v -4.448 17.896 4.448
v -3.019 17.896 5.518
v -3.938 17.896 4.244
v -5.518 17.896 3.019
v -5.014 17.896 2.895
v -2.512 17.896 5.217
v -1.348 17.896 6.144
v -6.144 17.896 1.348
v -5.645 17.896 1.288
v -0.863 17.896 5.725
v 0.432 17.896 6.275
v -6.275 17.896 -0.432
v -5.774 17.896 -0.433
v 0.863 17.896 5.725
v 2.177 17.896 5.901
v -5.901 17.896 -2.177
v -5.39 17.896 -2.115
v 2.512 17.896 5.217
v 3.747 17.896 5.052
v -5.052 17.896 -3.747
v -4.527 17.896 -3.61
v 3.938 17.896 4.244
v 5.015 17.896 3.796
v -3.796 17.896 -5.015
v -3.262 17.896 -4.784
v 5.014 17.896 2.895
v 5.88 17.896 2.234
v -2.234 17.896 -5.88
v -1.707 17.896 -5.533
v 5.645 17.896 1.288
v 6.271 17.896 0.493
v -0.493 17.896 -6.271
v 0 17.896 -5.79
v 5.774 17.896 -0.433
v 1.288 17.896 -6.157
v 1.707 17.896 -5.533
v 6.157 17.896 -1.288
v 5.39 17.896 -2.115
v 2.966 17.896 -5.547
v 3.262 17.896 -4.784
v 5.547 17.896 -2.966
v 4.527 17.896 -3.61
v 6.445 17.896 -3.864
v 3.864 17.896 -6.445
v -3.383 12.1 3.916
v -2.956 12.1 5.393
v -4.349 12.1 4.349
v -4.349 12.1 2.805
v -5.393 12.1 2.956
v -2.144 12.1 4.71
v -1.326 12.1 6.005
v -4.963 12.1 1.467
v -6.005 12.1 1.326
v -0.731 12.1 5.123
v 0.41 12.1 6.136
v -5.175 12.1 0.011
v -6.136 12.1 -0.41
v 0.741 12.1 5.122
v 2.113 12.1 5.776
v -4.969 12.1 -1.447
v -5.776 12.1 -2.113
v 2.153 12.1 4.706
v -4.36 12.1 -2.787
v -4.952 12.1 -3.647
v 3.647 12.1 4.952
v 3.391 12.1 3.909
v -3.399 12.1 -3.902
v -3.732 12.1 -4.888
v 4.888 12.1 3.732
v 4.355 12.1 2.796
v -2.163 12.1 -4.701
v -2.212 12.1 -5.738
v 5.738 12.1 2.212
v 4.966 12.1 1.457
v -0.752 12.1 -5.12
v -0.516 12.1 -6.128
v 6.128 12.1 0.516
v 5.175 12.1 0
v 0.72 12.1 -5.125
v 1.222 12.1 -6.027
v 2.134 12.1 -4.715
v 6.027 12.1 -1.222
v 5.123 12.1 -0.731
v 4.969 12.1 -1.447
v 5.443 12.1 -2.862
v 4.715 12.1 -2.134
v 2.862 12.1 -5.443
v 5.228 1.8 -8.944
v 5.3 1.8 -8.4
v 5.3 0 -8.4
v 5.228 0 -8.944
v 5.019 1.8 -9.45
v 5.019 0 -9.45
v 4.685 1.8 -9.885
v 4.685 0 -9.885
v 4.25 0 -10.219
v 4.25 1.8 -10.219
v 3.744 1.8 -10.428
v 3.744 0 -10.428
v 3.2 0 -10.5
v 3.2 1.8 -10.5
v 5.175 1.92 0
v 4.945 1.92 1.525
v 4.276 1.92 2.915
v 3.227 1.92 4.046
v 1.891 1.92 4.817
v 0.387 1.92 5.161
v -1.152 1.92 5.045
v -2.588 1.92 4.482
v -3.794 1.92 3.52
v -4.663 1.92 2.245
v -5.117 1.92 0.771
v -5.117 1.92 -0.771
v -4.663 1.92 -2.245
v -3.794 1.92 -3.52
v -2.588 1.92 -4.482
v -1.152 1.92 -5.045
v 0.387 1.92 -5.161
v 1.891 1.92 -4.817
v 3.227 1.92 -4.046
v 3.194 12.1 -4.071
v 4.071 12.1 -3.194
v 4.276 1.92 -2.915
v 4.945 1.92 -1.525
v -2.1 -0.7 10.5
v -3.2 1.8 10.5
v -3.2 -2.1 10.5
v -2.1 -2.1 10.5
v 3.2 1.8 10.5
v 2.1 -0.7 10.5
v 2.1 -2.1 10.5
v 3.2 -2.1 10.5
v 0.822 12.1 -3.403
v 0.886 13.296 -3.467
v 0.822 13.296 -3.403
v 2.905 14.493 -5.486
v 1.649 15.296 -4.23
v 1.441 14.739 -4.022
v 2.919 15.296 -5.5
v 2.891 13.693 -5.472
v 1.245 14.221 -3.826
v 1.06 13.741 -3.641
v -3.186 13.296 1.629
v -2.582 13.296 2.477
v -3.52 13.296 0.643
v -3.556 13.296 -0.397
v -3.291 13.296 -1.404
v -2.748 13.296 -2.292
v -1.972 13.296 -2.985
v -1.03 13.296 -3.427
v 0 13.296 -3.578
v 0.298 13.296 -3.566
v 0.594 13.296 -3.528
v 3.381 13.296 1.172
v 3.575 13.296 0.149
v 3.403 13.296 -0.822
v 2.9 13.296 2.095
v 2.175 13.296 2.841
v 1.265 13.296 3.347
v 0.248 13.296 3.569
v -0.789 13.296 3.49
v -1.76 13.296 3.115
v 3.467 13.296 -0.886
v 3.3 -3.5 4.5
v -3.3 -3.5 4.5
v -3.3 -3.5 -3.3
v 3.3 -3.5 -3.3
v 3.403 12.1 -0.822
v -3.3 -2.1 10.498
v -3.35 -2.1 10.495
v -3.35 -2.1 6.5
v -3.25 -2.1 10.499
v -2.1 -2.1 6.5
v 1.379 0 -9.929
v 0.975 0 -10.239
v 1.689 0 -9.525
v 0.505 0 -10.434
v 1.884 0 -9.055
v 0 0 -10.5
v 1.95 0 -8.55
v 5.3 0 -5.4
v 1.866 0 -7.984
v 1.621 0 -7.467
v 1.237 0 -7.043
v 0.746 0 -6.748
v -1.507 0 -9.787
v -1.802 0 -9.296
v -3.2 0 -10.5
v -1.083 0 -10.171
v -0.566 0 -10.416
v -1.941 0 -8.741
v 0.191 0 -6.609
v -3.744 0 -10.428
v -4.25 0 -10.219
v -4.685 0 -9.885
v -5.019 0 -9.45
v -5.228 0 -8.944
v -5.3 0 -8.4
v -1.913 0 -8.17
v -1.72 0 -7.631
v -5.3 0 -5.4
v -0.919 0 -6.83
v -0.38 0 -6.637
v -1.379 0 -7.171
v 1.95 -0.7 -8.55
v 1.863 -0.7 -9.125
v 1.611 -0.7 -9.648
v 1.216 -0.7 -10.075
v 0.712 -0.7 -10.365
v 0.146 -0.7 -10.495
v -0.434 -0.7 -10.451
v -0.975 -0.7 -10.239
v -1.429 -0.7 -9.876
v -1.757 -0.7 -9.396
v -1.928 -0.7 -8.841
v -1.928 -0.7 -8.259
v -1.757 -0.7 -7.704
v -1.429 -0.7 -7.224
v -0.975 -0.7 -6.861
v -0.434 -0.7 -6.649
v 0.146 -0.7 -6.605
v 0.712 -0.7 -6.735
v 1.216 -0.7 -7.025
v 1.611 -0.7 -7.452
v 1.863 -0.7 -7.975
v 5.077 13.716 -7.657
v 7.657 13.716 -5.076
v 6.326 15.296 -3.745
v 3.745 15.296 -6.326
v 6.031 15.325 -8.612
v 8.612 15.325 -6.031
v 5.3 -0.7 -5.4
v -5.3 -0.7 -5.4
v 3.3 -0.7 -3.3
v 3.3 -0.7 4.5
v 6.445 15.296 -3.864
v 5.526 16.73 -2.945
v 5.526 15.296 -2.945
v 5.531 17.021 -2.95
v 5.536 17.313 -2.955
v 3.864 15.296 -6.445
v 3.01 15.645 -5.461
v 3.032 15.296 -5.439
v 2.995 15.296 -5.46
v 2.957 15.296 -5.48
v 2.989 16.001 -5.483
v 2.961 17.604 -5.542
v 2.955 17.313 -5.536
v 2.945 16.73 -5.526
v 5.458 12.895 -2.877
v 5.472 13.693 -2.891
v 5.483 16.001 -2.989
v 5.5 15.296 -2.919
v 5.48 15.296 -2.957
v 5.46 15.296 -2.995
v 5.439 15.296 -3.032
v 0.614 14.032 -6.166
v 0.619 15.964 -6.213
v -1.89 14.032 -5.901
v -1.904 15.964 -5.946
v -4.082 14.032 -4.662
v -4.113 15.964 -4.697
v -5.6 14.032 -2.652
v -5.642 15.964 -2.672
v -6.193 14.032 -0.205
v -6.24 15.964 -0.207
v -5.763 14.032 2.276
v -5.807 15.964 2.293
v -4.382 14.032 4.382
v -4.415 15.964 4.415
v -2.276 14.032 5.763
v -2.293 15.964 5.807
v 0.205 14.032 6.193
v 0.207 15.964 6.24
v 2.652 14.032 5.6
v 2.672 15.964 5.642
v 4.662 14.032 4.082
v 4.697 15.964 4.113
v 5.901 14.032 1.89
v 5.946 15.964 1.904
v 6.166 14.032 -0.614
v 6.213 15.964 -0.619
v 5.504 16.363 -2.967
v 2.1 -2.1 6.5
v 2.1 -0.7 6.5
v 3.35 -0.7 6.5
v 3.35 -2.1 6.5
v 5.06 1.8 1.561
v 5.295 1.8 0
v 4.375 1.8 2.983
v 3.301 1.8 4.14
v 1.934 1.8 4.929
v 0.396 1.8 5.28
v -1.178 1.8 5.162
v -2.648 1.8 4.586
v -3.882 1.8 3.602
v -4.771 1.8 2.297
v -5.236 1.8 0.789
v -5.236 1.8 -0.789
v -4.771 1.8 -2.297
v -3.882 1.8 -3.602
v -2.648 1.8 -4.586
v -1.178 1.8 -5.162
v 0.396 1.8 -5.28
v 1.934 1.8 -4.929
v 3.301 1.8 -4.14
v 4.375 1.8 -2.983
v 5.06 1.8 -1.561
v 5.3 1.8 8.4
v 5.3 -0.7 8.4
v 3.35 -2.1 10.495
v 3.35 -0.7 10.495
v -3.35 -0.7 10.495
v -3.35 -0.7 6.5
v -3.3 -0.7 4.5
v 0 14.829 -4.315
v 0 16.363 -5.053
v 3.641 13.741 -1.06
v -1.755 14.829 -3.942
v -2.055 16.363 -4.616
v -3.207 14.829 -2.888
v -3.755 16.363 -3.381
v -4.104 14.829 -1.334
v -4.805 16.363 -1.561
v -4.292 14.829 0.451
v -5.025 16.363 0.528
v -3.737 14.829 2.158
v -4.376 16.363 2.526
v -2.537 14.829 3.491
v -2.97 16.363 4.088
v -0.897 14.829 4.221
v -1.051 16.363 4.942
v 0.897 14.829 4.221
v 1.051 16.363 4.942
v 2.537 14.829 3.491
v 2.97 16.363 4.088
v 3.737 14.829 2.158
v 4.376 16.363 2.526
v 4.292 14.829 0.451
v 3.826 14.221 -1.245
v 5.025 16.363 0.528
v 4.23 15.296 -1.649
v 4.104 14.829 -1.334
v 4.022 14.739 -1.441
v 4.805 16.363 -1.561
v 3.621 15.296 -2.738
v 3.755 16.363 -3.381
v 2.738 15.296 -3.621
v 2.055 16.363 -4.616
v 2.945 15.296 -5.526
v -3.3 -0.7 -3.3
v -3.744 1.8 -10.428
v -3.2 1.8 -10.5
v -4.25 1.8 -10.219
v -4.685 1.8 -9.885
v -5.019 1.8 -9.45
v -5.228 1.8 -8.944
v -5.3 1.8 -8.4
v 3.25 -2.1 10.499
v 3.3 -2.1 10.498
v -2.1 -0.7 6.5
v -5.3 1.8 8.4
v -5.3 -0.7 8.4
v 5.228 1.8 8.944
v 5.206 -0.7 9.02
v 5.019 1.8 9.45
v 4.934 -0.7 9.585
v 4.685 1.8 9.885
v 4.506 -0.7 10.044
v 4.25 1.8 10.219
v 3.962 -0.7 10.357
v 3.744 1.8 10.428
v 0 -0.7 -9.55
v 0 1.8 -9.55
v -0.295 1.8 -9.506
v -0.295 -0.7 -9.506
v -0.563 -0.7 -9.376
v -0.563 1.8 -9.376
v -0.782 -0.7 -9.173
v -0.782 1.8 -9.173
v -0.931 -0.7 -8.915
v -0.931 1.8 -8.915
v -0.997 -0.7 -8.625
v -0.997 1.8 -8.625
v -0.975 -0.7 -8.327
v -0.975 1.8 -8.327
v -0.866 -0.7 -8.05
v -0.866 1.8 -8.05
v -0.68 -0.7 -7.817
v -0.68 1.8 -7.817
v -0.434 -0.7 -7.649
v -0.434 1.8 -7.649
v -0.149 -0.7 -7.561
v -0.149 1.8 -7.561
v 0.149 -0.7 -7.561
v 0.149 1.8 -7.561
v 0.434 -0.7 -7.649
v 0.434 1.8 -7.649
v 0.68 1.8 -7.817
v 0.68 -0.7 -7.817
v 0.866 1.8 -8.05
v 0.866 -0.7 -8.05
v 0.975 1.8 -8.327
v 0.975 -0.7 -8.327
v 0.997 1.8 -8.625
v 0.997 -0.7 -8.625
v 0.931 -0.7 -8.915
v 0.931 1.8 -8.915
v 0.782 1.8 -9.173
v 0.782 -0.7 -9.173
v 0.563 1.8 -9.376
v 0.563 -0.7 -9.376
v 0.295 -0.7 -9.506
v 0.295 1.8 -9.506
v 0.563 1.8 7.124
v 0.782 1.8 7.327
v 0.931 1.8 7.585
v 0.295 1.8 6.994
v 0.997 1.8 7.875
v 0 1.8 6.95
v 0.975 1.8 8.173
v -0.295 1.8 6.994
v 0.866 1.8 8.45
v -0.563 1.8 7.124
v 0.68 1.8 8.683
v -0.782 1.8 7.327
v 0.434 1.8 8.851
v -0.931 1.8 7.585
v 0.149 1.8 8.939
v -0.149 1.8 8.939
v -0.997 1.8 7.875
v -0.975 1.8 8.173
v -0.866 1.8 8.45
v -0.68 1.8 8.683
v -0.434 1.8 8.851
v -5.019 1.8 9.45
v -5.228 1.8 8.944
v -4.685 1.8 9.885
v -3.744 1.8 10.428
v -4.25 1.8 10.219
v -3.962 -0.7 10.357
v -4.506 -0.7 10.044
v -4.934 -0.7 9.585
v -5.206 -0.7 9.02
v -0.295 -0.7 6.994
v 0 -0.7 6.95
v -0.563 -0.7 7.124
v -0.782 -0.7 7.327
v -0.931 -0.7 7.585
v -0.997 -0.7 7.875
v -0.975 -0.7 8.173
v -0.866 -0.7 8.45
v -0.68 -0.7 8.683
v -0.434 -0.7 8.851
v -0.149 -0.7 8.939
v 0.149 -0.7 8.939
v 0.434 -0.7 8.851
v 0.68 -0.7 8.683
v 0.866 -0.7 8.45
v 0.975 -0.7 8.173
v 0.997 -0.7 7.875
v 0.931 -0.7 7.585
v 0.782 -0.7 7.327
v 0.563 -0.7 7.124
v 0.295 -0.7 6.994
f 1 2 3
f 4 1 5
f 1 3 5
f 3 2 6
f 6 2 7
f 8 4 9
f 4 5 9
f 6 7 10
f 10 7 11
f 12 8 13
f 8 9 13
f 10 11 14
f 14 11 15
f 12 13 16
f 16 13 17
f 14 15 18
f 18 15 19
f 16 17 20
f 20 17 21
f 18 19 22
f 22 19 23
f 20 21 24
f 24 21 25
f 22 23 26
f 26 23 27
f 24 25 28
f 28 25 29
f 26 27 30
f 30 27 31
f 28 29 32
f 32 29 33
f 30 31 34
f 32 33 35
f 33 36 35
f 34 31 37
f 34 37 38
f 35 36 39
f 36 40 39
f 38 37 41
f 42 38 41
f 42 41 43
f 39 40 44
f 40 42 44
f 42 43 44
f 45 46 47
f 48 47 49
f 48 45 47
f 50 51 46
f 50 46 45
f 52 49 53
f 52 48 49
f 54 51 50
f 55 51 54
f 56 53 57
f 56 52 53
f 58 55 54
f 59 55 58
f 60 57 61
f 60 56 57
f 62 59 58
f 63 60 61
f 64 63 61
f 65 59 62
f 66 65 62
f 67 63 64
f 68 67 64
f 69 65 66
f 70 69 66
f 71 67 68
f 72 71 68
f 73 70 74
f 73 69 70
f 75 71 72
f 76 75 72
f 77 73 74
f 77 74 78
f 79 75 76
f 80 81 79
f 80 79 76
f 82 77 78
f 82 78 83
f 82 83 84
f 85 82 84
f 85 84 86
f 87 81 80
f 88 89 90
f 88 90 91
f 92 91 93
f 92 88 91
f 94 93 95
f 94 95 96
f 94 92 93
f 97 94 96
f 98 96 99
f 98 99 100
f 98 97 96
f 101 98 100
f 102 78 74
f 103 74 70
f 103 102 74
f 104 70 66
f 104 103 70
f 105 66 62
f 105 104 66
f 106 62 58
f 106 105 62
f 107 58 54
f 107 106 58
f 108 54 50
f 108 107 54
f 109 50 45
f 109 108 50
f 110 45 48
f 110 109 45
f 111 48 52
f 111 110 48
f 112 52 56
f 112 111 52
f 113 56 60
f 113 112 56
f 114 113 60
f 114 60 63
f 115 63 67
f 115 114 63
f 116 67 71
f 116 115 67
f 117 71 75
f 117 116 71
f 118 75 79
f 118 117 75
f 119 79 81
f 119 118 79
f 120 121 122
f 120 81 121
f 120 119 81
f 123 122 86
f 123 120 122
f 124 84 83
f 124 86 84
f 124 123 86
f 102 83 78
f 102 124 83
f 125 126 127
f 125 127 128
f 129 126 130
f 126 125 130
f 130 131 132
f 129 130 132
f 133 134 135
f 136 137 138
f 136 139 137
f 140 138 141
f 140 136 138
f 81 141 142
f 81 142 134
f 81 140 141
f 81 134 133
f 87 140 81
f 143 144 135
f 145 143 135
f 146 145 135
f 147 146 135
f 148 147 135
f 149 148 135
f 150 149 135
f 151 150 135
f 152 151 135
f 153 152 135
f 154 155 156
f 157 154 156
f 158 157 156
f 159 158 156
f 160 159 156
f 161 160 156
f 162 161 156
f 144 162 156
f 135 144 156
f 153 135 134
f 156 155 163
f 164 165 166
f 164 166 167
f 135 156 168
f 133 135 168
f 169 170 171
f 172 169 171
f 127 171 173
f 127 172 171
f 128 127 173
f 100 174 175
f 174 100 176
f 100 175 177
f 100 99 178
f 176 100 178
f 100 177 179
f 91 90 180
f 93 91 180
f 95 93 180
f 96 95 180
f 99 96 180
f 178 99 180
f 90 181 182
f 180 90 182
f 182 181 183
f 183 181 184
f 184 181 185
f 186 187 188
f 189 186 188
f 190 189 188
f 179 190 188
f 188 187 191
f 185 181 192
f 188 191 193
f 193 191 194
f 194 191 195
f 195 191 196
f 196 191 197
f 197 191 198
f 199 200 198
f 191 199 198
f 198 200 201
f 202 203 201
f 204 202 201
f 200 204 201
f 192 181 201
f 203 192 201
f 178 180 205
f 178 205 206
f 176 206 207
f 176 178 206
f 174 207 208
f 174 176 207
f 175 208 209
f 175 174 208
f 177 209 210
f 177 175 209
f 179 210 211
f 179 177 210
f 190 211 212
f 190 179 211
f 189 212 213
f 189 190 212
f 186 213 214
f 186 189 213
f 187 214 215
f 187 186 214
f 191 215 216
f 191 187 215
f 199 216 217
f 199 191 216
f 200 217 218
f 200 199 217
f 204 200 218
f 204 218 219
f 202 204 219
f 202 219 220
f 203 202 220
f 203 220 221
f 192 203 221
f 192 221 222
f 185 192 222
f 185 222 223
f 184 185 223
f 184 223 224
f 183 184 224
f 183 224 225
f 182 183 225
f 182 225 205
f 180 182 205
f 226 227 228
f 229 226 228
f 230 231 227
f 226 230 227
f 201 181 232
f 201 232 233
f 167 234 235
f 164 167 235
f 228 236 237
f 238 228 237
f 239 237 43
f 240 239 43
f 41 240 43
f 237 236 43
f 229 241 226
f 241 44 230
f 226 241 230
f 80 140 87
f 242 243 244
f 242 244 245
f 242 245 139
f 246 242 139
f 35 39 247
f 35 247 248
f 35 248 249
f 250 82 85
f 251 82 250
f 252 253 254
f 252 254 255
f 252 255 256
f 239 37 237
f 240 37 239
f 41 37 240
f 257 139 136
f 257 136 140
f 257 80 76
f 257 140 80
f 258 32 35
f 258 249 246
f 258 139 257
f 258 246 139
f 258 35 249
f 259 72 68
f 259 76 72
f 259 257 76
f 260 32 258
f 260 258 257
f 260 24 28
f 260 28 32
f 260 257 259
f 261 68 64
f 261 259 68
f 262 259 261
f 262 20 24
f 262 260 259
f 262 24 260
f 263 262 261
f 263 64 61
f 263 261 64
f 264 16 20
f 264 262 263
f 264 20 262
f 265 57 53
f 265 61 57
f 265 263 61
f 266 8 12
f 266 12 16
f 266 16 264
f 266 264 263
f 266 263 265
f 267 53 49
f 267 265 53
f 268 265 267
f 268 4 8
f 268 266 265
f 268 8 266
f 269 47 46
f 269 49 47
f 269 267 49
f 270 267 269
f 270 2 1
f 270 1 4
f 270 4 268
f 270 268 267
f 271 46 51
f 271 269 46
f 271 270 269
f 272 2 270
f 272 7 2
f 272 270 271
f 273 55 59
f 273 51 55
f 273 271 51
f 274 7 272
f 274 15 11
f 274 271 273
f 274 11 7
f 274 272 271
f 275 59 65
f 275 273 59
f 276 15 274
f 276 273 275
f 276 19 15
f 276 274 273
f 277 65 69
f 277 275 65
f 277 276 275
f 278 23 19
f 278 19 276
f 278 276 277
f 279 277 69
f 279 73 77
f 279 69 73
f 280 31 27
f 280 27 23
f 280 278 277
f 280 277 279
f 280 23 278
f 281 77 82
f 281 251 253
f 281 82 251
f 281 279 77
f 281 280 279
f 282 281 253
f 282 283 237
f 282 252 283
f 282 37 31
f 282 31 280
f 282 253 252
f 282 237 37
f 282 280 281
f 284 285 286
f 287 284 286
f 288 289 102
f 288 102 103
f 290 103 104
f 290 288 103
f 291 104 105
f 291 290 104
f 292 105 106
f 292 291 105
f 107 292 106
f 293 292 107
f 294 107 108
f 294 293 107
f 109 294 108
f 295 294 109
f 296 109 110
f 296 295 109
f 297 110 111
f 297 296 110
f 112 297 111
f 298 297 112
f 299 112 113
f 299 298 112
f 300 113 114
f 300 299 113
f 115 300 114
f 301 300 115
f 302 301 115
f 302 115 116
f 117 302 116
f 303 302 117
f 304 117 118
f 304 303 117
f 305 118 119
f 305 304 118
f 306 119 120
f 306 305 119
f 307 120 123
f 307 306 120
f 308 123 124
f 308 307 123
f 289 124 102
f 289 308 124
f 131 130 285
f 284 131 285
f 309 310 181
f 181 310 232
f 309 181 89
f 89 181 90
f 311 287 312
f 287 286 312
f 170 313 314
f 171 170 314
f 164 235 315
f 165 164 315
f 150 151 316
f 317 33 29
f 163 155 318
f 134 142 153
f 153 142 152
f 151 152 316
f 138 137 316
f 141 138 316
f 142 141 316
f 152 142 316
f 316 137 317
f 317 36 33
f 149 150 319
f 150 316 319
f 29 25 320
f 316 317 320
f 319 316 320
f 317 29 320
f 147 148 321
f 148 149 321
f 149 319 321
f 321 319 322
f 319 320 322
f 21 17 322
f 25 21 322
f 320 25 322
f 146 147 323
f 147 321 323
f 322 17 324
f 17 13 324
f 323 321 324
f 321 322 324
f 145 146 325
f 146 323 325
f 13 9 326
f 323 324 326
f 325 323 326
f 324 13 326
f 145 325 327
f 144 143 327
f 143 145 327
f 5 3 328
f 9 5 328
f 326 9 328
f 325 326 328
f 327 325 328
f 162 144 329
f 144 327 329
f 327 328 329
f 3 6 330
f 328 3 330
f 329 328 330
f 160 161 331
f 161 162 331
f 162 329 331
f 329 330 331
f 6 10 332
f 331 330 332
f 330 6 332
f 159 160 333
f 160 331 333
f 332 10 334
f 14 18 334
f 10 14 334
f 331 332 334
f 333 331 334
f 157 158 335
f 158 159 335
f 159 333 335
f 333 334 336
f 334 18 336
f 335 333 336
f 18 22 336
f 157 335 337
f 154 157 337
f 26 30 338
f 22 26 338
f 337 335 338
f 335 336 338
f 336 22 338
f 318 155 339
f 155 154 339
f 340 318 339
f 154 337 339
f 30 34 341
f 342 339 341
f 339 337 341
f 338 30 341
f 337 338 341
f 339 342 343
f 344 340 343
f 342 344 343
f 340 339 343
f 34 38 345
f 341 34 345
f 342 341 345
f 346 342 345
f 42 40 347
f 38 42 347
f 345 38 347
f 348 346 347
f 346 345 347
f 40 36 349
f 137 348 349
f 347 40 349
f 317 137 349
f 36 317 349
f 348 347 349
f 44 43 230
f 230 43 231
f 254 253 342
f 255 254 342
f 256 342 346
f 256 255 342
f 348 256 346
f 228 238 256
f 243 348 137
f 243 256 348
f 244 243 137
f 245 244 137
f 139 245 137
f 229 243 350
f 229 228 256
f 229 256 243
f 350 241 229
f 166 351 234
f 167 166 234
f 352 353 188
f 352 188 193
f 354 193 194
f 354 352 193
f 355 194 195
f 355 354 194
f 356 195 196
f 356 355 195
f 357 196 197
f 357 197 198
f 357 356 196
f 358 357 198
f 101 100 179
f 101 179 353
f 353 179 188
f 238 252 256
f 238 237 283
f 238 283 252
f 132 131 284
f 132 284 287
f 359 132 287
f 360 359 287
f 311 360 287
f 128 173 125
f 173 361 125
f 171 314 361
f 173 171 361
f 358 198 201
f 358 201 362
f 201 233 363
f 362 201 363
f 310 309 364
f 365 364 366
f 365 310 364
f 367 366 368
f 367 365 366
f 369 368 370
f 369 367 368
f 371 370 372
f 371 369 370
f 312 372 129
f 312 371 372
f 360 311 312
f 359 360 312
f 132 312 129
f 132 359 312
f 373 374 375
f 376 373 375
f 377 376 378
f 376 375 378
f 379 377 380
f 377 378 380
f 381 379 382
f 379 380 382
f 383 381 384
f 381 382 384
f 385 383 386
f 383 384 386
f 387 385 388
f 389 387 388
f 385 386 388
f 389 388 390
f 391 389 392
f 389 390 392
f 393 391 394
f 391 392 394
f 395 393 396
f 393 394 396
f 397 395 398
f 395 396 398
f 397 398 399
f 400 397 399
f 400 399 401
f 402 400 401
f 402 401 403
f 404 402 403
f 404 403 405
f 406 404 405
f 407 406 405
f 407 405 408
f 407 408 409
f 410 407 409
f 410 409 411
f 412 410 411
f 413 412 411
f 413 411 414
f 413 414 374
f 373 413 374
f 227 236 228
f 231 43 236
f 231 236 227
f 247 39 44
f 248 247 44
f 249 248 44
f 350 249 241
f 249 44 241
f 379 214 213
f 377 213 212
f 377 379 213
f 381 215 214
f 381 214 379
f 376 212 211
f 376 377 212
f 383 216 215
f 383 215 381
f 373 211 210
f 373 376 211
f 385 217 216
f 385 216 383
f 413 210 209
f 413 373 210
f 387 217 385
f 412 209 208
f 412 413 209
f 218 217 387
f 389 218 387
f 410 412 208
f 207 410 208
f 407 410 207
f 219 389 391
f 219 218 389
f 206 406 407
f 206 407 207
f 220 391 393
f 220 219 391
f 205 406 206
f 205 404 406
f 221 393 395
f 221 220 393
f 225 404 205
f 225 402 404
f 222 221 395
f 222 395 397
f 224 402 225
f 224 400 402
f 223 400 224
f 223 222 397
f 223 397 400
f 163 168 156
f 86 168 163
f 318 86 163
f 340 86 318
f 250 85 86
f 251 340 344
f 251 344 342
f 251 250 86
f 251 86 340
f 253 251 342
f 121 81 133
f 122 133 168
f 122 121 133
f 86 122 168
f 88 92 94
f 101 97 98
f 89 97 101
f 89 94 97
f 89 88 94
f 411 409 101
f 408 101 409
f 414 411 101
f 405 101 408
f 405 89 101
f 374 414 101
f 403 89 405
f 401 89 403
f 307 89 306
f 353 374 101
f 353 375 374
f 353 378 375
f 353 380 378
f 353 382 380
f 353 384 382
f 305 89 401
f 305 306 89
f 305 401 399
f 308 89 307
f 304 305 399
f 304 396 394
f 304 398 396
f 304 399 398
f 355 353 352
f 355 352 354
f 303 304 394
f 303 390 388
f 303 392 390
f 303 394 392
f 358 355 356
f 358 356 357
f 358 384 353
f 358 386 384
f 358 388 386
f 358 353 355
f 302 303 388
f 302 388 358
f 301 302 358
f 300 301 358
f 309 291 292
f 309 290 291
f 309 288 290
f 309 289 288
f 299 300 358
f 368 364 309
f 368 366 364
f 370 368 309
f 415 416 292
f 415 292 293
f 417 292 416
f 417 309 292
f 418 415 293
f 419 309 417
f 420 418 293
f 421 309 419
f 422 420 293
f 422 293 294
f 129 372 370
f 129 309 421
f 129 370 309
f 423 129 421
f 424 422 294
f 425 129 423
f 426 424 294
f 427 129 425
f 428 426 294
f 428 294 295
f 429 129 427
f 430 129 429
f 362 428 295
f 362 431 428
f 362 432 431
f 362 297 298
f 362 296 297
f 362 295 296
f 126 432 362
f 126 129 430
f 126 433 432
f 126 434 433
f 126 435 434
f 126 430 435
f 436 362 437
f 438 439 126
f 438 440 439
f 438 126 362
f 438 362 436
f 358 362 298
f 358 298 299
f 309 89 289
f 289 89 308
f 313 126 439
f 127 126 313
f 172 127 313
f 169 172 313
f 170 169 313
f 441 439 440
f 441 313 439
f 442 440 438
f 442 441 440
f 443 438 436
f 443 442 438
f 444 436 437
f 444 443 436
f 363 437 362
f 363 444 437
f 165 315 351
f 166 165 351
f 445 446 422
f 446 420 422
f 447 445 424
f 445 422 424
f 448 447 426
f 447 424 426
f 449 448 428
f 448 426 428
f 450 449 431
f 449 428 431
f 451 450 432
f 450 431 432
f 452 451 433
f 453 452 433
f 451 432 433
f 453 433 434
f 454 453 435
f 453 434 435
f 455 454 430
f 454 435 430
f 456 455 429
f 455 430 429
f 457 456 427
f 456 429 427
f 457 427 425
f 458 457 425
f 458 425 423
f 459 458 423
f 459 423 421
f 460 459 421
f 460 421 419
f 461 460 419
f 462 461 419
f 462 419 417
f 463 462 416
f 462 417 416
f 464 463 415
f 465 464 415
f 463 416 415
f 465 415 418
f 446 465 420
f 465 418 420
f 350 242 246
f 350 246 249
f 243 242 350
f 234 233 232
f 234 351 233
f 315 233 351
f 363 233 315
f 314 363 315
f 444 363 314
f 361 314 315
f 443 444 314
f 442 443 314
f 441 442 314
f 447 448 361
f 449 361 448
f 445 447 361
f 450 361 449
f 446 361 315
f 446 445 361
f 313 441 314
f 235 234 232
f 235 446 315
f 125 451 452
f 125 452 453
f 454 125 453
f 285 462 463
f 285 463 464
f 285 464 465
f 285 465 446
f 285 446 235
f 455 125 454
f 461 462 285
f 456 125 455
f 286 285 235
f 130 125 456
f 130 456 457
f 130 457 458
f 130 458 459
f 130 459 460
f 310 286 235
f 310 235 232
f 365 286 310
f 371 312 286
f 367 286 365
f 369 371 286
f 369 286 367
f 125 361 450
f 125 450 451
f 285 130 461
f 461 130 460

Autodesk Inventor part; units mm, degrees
ref_plane "YZ Plane" through (0, 0, 0) normal (1, 0, 0) x (0, 1, 0)
ref_plane "XZ Plane" through (0, 0, 0) normal (0, 1, 0) x (-1, 0, 0)
sketch "Sketch1" plane through (0, 0, 0) normal (0, 1, 0) x (-1, 0, 0)
  line L0 (-5.3, -10.5) -> (5.3, -10.5)
  line L1 (5.3, -10.5) -> (5.3, 10.5)
  line L2 (5.3, 10.5) -> (-5.3, 10.5)
  line L3 (-5.3, 10.5) -> (-5.3, -10.5)
  line L4 (-5.3, -10.5) -> (5.3, 10.5) construction
  line L5 (5.3, -10.5) -> (-5.3, 10.5) construction
  point P0 (0, 0)
  dimension "d0" = 10.6
  dimension "d1" = 21
extrude "Extrusion1" add sketch "Sketch1" along normal blind 1.8
sketch "Sketch2" plane through (0, 0, 0) normal (0, -1, 0) x (1, 0, 0)
  line L0 (5.3, -10.5) -> (-5.3, -10.5) projected
  line L1 (5.3, 10.5) -> (5.3, -10.5) projected
  line L2 (-5.3, 10.5) -> (5.3, 10.5) projected
  line L3 (-5.3, -10.5) -> (-5.3, 10.5) projected
  line L4 (5.3, 10.5) -> (5.3, -10.5) projected
  line L5 (5.3, -5.4) -> (-5.3, -5.4)
  line L6 (-5.3, -10.5) -> (-5.3, 10.5) projected
  point P0 (0, 0)
  dimension "d4" = 15.9
extrude "Extrusion2" add sketch "Sketch2" along normal blind 0.7 contours L5 L3 L2 L1
sketch "Sketch3" plane through (0, -0.7, 0) normal (0, -1, 0) x (1, 0, 0)
  line L0 (5.3, 10.5) -> (-5.3, 10.5) projected
  line L1 (-5.3, 10.5) -> (-5.3, -5.4) projected
  line L2 (-5.3, -5.4) -> (5.3, -5.4) projected
  line L3 (5.3, -5.4) -> (5.3, 10.5) projected
  line L4 (-5.3, 10.5) -> (5.3, 10.5) projected
  line L5 (3.35, 10.5) -> (2.1, 10.5)
  line L6 (2.1, 10.5) -> (2.1, 6.5)
  line L7 (2.1, 6.5) -> (3.35, 6.5)
  line L8 (3.35, 6.5) -> (3.35, 10.5)
  line L9 (-2.1, 10.5) -> (-3.35, 10.5)
  line L10 (-3.35, 10.5) -> (-3.35, 6.5)
  line L11 (-3.35, 6.5) -> (-2.1, 6.5)
  line L12 (-2.1, 6.5) -> (-2.1, 10.5)
  line L13 (2.1, 7.4366) -> (-2.1, 7.4366) construction
  line L14 (0, 0) -> (0, 2.1174)
  point P0 (0, 7.4366)
  dimension "d7" = 1.25
  dimension "d8" = 4
  dimension "d9" = 1.25
  dimension "d10" = 4
  dimension "d11" = 4.2
extrude "Extrusion3" add sketch "Sketch3" along normal blind 1.4 contours L8 L7 L6 L0 | L12 L11 L10 L0
sketch "Sketch4" plane through (0, -0.7, 0) normal (0, -1, 0) x (1, 0, 0)
  line L0 (3.3, 4.5) -> (-3.3, 4.5)
  line L1 (-3.3, 4.5) -> (-3.3, -3.3)
  line L2 (-3.3, -3.3) -> (3.3, -3.3)
  line L3 (3.3, -3.3) -> (3.3, 4.5)
  line L4 (0, 0) -> (0, 1.0845)
  line L5 (2.1, 10.5) -> (-2.1, 10.5) projected
  point P0 (0, 4.5)
  dimension "d14" = 6.6
  dimension "d15" = 7.8
  dimension "d16" = 6
extrude "Extrusion4" add sketch "Sketch4" along normal blind 2.8
sketch "Sketch5" plane through (0, 0, 0) normal (0, -1, 0) x (1, 0, 0)
  circle A0 centre (0, -8.55) radius 1.95
  line L0 (5.3, -10.5) -> (-5.3, -10.5) projected
  point P0 (0, 0)
  dimension "d19" = 3.9
extrude "Extrusion5" add sketch "Sketch5" along normal up to surface (0.7 mm away)
sketch "Sketch6" plane through (0, -0.7, 0) normal (0, -1, 0) x (1, 0, 0)
  line L0 (3.3, 4.5) -> (3.3, -3.3) projected
  line L1 (3.3, -3.3) -> (-3.3, -3.3) projected
  line L2 (-3.3, -3.3) -> (-3.3, 4.5) projected
  line L3 (-3.3, 4.5) -> (3.3, 4.5) projected
  line L4 (-3.35, 6.5) -> (-3.35, 10.5) projected
  line L5 (-3.35, 10.5) -> (-5.3, 10.5) projected
  line L6 (-5.3, 10.5) -> (-5.3, -5.4) projected
  line L7 (-5.3, -5.4) -> (5.3, -5.4) projected
  line L8 (5.3, -5.4) -> (5.3, 10.5) projected
  line L9 (5.3, 10.5) -> (3.35, 10.5) projected
  line L10 (3.35, 10.5) -> (3.35, 6.5) projected
  line L11 (3.35, 6.5) -> (2.1, 6.5) projected
  line L12 (2.1, 6.5) -> (2.1, 10.5) projected
  line L13 (2.1, 10.5) -> (-2.1, 10.5) projected
  line L14 (-2.1, 10.5) -> (-2.1, 6.5) projected
  line L15 (-2.1, 6.5) -> (-3.35, 6.5) projected
  circle A0 centre (0, -8.55) radius 1.95 projected
  point P0 (0, 0)
  point P1 (0, 7.95)
  dimension "d22" = 16.5
hole "Hole1" at (0, -0.7, 7.95) at (0, -0.7, -8.55) direction (0, 1, 0) diameter 2 end through all
fillet "Fillet1" radius 2.1 4 edges at (-5.3, 0.55, 10.5) (5.3, 0.55, 10.5) (5.3, 0.9, -10.5) (-5.3, 0.9, -10.5)
sketch "Sketch7" plane through (0, 1.8, 0) normal (0, 1, 0) x (1, 0, 0)
  circle A0 centre (0, 0) radius 5.175
  dimension "d31" = 10.35
extrude "Extrusion6" add sketch "Sketch7" along normal blind 10.3
sketch "Sketch8" plane through (0, 0, 0) normal (1, 0, 0) x (0, 1, 0)
  line L0 (12.1, -5.175) -> (12.1, 5.175) projected
  line L1 (1.8, 5.175) -> (1.8, -5.175) projected
  line L2 (12.1, -5.175) -> (12.1, 5.175) projected
  line L3 (12.1, -5.175) -> (12.1, -6.15)
  line L4 (12.1, -6.15) -> (17.8961, -6.29)
  line L5 (17.8961, -6.29) -> (17.8961, -5.79)
  line L6 (17.8961, 0) -> (12.1, 0)
  line L7 (17.8961, -5.79) -> (13.2961, -3.5781)
  line L8 (13.2961, -3.5781) -> (13.2961, 0)
  point P0 (0, 0)
  dimension "d34" = 12.3
  dimension "d35" = 12.58
  dimension "d37" = 2.6
  dimension "d38" = 4.6
  dimension "d39" = 0.5
revolve "Revolution1" add sketch "Sketch8" angle 360 about axis through (0, 17.8961, 0) along (0, -1, 0)
chamfer "Chamfer1" distance 0.12 angle 45 1 edges at (-5.175, 1.8, 0)
sketch "Sketch9" plane through (0, 17.8961, 0) normal (0, 1, 0) x (1, 0, 0)
  line L0 (0, 0) -> (4.9828, 4.9828) construction
  line L1 (0, 0) -> (0, 2.6372) construction
  dimension "d43" = 45
ref_plane "Work Plane2" through (4.4477, 17.8961, -4.4477) normal (-0.7071, 0, 0.7071) x (0, -1, 0)
sketch "Sketch11" plane through (4.4477, 17.8961, -4.4477) normal (-0.7071, 0, 0.7071) x (0, -1, 0)
  line L0 (0, -6.29) -> (0, 6.29) projected
  line L1 (5.7961, -6.15) -> (5.7961, 6.15) projected
  line L2 (5.7961, 5.175) -> (5.7961, -5.175) projected
  line L3 (5.7961, 1.825) -> (2.6, 1.825)
  line L4 (2.6, 1.825) -> (2.6, -1.825)
  line L5 (2.6, -1.825) -> (5.7961, -1.825)
  line L6 (5.7961, -1.825) -> (5.7961, 1.825)
  line L7 (0, 0) -> (0.8817, 0)
  point P0 (17.8961, 0)
  point P1 (2.6, 0)
  dimension "d45" = 3.65
  dimension "d46" = 2.6
extrude "Extrusion7" cut sketch "Sketch11" along normal blind 3.3
sketch "Sketch12" plane through (4.4477, 17.8961, -4.4477) normal (-0.7071, 0, 0.7071) x (0, -1, 0)
  line L0 (5.7961, 1.825) -> (2.6, 1.825) projected
  line L1 (2.6, 1.825) -> (2.6, -1.825) projected
  line L2 (2.6, -1.825) -> (5.7961, -1.825) projected
  line L3 (5.7961, 1.825) -> (5.7961, -1.825) projected
  line L4 (0, -6.29) -> (0, 6.29) projected
  line L5 (0, -6.29) -> (0, 6.29) projected
  line L6 (2.6, 1.825) -> (0, 1.825)
  line L7 (0, 1.825) -> (0, -1.825)
  line L8 (0, -1.825) -> (2.6, -1.825)
  line L9 (2.6, -1.825) -> (2.6, 1.825)
  point P0 (17.8961, 0)
extrude "Extrusion8" add sketch "Sketch12" along normal blind 0.3 and the other way blind 1 contours L1 L8 L4 L6
sketch "Sketch13" plane through (6.4453, 15.2961, -3.8643) normal (0.7071, 0, 0.7071) x (0.7071, 0, -0.7071)
  line L0 (-1.3, 0) -> (-1.3, 1.4344) projected
  line L1 (-1.3, 0) -> (0, 0) projected
  line L2 (0, 2.6) -> (0, 0) projected
  line L3 (0, 2.6) -> (-1.2706, 2.6) projected
  line L4 (0, 2.6) -> (-1.2706, 2.6) projected
  line L5 (0, 2.6) -> (3.0642, 0.0288)
  line L6 (3.0642, 0.0288) -> (1.7143, -1.5798)
  line L7 (1.7143, -1.5798) -> (-0.1685, 0)
  line L8 (-1.3, 0) -> (0, 0) projected
  point P0 (-7.29, -15.2961)
  dimension "d53" = 2.6
  dimension "d54" = 2.1
  dimension "d55" = 40
  dimension "d56" = 4
extrude "Extrusion9" add sketch "Sketch13" against normal up to surface (3.65 mm away)
properties part number "xtion_projector" material "Thermoplastic Resin"
